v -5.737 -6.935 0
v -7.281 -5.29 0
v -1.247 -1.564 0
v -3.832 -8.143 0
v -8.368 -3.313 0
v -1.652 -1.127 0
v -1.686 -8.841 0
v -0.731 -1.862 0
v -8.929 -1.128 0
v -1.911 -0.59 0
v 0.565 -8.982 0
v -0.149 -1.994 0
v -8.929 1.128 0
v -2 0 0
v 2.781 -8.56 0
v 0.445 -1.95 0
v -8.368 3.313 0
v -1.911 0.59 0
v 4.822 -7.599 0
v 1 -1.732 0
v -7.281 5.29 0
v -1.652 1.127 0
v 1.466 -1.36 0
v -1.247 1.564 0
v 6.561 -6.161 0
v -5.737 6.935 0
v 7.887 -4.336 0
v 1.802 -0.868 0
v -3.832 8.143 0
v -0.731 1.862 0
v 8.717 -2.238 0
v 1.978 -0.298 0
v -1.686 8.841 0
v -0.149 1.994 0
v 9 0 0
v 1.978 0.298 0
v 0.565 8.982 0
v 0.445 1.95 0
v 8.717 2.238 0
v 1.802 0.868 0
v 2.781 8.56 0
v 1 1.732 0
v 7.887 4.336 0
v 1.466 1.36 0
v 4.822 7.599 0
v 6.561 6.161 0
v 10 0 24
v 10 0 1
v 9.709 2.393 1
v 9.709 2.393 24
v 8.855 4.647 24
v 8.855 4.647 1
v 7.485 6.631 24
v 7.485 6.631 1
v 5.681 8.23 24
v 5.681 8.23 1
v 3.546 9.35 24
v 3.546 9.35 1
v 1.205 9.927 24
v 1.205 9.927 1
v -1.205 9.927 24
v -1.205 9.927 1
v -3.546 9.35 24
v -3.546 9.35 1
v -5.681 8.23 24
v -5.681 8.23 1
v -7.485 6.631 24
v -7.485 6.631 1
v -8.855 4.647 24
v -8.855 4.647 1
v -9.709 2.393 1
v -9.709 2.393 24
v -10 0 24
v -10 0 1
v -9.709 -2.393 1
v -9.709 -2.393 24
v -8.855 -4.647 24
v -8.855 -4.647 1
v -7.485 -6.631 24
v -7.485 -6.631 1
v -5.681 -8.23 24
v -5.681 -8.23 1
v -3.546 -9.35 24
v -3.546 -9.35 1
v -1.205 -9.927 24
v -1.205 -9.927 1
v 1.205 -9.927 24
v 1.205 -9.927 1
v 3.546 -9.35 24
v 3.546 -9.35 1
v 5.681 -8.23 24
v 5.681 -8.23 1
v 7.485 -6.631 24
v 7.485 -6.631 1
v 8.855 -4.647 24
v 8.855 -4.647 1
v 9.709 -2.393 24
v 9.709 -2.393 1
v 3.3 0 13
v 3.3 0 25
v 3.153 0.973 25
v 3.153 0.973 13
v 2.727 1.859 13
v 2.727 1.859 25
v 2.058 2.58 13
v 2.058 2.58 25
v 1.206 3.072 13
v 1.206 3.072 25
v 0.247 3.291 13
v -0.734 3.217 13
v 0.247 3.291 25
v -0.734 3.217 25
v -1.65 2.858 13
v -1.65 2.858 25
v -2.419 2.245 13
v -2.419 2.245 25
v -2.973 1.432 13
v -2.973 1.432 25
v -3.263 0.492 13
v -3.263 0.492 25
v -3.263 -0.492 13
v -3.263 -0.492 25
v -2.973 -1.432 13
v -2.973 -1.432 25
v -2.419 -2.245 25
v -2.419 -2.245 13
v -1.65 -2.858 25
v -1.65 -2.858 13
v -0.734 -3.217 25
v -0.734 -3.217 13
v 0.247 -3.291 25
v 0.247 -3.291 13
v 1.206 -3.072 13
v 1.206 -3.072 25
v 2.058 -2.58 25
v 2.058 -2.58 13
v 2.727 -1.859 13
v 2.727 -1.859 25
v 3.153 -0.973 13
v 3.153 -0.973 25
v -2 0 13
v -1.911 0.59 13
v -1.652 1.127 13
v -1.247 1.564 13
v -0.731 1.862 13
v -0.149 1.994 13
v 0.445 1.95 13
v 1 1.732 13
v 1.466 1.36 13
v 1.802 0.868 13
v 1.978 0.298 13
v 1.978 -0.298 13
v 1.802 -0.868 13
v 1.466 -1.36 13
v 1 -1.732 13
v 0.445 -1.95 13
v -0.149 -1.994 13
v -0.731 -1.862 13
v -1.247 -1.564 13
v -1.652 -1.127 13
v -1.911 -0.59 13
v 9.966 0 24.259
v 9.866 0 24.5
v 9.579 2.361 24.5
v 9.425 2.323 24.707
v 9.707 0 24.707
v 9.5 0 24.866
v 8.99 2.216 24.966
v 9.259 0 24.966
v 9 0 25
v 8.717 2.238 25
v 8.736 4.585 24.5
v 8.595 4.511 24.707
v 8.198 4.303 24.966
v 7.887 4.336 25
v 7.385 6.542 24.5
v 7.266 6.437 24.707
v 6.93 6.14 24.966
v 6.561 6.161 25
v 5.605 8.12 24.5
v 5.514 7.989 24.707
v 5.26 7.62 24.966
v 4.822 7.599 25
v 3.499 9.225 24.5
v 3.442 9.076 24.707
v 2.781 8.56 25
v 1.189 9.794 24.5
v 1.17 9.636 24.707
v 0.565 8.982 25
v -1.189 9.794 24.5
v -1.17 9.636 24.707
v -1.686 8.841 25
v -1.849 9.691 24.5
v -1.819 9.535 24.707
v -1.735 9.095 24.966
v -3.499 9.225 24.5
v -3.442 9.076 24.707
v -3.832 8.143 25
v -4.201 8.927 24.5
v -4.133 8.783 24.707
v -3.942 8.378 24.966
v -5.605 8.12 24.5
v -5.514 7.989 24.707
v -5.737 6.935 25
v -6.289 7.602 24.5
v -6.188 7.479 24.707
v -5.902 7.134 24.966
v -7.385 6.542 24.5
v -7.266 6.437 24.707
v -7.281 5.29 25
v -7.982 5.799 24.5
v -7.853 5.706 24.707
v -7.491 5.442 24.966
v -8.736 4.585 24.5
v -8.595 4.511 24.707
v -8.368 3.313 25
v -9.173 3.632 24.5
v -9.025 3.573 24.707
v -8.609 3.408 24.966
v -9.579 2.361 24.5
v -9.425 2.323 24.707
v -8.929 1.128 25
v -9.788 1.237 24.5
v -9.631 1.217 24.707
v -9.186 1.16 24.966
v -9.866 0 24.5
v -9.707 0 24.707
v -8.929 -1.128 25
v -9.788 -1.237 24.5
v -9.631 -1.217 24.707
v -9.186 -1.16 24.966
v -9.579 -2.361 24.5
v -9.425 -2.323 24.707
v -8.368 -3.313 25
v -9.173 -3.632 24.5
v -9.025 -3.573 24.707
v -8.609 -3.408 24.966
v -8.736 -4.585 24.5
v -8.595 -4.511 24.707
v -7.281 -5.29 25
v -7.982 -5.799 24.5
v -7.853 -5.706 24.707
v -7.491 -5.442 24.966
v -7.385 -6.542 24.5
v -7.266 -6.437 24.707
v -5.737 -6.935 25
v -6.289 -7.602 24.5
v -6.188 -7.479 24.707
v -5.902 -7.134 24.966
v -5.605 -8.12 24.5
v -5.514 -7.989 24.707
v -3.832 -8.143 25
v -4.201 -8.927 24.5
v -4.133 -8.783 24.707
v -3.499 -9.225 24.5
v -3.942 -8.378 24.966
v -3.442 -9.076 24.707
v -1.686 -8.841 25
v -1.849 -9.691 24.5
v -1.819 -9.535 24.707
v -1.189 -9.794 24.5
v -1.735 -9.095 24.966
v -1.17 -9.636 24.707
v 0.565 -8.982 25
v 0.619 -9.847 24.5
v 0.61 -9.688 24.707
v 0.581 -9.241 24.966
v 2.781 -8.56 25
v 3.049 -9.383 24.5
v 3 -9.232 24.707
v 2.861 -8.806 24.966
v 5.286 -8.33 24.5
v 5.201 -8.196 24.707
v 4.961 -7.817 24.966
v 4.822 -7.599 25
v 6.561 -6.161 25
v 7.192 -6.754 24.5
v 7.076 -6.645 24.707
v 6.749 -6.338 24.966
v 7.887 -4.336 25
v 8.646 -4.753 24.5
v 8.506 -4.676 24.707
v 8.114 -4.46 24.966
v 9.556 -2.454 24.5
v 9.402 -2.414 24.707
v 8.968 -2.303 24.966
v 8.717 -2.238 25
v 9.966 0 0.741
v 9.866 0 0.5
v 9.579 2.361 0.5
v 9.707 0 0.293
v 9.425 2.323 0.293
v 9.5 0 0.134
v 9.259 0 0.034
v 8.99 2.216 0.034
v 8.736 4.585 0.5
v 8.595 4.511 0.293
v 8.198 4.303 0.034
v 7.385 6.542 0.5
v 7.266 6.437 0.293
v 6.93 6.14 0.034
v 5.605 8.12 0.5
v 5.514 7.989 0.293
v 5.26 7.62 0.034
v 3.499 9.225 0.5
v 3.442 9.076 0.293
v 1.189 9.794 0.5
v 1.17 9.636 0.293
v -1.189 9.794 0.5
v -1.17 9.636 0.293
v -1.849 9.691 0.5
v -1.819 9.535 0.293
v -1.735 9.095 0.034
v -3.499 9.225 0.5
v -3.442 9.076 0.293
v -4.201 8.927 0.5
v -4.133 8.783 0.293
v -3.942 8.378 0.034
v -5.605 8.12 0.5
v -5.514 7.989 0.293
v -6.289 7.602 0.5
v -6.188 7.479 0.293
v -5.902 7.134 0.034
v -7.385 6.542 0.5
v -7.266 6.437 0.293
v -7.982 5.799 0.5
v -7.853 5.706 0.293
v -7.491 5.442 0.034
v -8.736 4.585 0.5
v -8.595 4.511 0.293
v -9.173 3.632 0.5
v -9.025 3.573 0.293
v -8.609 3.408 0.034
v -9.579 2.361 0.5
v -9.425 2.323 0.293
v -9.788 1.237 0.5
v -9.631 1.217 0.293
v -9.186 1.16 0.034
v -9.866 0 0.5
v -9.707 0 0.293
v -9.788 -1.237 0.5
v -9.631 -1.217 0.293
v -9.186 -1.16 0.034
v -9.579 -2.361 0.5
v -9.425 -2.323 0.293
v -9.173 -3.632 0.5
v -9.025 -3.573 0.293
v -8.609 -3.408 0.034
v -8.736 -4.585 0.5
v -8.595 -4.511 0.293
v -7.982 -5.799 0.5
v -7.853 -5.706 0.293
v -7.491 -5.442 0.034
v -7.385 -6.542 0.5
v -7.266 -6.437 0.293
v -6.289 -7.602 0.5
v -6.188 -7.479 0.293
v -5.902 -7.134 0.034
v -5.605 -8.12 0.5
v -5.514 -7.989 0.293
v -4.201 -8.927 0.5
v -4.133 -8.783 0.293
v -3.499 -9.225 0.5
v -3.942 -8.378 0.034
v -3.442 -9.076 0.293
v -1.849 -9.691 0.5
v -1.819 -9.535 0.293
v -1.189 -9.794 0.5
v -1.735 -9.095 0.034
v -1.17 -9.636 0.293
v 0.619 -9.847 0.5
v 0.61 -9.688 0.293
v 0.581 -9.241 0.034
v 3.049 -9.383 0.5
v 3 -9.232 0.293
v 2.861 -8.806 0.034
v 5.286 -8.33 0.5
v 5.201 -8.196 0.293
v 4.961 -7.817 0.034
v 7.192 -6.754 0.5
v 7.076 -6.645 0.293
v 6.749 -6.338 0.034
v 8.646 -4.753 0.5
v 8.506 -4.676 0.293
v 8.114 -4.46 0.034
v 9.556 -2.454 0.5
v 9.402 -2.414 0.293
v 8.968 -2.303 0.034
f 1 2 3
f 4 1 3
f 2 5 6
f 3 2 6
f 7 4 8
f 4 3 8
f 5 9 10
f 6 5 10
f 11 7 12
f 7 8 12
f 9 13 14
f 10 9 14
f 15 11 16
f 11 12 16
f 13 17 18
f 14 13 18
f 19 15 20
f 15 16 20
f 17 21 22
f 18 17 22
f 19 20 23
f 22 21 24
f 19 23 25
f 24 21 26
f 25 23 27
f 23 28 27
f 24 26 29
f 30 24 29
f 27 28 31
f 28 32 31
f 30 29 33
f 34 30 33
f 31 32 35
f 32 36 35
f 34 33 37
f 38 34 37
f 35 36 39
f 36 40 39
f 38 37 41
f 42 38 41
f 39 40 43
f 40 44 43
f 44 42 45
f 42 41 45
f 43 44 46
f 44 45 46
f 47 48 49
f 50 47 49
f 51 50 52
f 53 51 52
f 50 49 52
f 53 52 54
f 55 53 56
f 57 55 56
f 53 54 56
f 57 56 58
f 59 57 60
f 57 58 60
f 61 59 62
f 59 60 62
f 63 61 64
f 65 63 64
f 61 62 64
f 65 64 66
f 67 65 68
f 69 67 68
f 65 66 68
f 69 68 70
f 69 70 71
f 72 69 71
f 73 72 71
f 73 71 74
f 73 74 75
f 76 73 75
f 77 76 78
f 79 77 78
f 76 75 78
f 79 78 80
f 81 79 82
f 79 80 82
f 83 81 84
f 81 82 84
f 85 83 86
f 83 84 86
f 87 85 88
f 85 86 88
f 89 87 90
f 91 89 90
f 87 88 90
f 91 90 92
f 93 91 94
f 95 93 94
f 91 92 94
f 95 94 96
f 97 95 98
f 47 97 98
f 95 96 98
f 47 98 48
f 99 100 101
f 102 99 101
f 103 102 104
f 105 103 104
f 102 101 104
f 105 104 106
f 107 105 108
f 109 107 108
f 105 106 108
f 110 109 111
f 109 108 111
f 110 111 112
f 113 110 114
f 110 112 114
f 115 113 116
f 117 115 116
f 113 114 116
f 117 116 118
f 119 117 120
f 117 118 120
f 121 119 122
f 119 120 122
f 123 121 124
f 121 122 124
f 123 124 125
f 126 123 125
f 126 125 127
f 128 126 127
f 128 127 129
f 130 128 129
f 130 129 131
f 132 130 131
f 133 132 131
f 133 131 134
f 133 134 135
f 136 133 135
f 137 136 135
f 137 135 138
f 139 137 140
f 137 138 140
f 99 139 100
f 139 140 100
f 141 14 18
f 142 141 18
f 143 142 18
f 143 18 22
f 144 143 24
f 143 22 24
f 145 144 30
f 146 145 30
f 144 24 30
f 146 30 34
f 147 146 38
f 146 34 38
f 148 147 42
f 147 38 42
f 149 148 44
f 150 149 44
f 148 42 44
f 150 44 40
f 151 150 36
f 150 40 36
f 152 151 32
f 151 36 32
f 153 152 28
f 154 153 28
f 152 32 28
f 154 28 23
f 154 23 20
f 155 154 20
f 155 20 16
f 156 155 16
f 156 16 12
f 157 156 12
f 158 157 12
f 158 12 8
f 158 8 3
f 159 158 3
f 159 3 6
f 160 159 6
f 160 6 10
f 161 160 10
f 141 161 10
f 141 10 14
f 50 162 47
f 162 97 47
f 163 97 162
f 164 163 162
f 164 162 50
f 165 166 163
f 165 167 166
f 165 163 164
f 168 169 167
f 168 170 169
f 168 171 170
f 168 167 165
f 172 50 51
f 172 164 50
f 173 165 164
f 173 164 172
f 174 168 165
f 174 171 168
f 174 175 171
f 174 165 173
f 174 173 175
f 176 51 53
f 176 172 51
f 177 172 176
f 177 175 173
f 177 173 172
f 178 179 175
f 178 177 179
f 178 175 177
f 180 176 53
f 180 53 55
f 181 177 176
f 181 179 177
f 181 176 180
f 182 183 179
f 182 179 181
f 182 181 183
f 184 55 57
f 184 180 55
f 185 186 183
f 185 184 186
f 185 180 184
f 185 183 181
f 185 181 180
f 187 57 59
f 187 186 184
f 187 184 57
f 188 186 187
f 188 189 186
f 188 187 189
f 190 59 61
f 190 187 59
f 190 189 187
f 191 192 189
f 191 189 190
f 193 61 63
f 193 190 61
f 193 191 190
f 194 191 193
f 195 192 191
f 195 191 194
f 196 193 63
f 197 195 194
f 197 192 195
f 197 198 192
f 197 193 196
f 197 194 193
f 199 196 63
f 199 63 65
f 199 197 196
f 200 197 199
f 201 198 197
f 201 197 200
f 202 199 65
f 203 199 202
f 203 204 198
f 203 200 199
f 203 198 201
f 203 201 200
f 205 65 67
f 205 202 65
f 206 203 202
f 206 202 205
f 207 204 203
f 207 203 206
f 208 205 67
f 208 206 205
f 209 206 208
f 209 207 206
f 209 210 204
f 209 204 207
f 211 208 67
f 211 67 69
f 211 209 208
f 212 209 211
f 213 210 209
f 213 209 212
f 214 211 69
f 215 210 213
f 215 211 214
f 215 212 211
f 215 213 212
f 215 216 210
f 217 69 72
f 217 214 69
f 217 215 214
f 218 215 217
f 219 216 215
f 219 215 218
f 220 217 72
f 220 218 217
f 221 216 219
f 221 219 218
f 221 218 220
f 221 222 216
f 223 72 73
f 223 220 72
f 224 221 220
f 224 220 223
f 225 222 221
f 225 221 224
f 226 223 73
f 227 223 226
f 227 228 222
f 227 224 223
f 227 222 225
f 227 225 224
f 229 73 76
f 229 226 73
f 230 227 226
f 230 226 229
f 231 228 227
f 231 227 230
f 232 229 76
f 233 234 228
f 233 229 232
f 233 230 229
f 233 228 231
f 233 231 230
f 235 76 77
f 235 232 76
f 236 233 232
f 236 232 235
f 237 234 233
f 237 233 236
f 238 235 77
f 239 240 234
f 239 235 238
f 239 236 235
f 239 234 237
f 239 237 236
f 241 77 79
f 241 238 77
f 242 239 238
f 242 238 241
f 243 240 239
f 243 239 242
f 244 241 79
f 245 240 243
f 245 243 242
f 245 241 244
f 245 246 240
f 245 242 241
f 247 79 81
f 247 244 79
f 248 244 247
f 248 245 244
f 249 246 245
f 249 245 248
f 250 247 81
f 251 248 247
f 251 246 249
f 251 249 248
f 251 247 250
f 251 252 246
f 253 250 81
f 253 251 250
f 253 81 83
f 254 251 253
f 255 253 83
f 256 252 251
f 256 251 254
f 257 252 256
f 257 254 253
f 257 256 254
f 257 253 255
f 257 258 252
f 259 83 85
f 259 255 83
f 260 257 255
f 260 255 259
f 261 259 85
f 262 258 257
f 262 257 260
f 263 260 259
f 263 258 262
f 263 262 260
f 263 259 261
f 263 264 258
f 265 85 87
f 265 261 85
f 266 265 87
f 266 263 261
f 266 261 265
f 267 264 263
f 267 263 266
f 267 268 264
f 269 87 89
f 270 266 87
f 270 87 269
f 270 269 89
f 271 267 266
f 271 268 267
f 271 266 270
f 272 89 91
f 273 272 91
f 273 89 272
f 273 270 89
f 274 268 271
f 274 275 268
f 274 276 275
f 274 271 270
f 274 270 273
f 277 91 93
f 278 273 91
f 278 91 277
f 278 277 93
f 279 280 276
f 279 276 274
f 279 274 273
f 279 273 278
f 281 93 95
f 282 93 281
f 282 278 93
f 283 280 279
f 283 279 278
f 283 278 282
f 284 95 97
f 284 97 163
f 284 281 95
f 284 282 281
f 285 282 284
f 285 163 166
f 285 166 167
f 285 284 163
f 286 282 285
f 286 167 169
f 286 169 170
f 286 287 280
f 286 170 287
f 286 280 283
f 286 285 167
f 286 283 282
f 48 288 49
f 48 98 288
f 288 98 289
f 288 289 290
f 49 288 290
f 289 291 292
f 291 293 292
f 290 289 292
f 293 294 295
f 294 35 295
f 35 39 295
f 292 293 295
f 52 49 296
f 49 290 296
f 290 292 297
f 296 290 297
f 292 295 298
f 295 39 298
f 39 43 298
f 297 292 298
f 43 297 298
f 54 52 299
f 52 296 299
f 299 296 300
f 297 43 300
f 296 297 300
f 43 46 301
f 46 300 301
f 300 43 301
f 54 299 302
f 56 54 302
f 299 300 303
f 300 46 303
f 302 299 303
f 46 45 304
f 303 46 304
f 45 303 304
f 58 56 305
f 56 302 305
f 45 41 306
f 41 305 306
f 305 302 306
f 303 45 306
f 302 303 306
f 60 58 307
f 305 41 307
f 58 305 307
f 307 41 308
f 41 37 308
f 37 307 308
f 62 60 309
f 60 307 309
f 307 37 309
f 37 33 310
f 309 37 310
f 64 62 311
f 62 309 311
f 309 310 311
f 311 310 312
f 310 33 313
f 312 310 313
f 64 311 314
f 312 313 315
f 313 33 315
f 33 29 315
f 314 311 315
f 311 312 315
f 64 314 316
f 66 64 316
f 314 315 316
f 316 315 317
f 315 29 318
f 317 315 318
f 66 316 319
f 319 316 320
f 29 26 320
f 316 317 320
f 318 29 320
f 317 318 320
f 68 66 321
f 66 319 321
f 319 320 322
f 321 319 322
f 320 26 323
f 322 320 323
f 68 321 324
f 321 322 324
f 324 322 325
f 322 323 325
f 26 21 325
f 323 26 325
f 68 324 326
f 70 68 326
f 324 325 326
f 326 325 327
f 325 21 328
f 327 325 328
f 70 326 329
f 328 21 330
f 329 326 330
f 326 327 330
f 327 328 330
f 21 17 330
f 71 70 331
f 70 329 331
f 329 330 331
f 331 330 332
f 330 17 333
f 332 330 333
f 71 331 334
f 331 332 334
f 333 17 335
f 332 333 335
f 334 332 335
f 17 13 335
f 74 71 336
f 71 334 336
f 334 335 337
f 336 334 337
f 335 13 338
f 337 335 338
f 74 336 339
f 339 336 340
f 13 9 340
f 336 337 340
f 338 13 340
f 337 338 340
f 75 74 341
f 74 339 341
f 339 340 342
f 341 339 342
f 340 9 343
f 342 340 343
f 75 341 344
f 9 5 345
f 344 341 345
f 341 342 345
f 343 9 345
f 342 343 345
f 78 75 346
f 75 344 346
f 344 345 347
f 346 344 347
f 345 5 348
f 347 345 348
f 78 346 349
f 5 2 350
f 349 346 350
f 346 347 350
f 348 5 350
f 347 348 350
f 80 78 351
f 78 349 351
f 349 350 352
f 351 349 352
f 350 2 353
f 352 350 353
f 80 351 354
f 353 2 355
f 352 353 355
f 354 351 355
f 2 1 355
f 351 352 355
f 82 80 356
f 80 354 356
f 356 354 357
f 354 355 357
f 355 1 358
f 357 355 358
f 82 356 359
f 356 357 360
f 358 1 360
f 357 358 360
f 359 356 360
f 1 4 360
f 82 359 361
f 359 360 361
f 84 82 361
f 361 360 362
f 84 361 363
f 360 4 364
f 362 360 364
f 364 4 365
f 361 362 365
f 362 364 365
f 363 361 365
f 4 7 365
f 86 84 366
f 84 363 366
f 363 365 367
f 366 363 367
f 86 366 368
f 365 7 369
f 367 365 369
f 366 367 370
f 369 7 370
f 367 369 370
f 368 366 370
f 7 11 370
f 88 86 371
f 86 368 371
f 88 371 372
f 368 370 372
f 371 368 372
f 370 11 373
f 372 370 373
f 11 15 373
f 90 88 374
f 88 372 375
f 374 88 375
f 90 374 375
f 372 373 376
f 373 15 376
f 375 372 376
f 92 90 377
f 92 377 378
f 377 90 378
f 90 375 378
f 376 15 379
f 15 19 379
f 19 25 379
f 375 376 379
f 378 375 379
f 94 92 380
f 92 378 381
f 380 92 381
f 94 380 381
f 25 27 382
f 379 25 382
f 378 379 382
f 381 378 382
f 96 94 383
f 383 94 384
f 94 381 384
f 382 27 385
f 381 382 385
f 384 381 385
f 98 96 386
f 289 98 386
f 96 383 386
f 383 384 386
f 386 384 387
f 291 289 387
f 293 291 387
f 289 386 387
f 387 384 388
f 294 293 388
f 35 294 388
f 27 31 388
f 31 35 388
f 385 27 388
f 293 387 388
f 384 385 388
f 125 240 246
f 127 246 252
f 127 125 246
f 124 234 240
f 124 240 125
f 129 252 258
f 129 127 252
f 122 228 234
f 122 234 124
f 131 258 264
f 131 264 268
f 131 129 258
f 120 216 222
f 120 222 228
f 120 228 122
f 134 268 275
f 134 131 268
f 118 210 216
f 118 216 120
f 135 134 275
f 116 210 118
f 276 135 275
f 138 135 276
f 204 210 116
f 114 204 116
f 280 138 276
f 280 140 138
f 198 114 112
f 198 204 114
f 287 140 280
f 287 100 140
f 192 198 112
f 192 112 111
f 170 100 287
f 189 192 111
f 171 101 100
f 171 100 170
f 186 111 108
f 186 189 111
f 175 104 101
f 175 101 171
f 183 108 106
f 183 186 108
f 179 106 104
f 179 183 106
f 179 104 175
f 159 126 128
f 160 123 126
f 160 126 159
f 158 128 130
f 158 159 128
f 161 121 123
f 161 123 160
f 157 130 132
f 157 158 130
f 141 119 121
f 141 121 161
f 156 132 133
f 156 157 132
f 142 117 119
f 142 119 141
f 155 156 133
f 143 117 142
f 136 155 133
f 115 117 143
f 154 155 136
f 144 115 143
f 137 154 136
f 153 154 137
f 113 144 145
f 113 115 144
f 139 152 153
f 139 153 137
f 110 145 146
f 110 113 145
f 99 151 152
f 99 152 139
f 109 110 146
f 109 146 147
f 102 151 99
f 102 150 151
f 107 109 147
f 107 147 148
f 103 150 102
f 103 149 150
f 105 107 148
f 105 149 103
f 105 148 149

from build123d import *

# Parameters (mm, degrees)
SKETCH_1_R          = 10
EXTRUDE_1_DEPTH     = 25
SKETCH_2_R          = 3.3
CUT_EXTRUDE_1_DEPTH = 12
FILLET_1_R          = 1
SKETCH_3_R          = 2
CUT_EXTRUDE_2_DEPTH = 29.722813268


with BuildPart() as part:
    # 草图1 → 凸台-拉伸1 (new body)
    with BuildSketch(Plane.XY):
        Circle(SKETCH_1_R)
    extrude(amount=EXTRUDE_1_DEPTH)

    # 草图2 → 切除-拉伸1 (cut)
    with BuildSketch(Plane.XY.offset(25)):
        Circle(SKETCH_2_R)
    extrude(amount=-CUT_EXTRUDE_1_DEPTH, mode=Mode.SUBTRACT)

    # 圆角1
    fillet_1_edges = [part.edges().sort_by_distance(p)[0] for p in [
        (-10, 0, 0),
        (-10, 0, 25),
    ]]
    fillet(fillet_1_edges, radius=FILLET_1_R)

    # 草图3 → 切除-拉伸2 (cut, through all)
    with BuildSketch(Plane(origin=(0, 0, 0), x_dir=(-1, 0, 0), z_dir=(0, 0, -1))):
        Circle(SKETCH_3_R)
    extrude(amount=-CUT_EXTRUDE_2_DEPTH, mode=Mode.SUBTRACT)


solid = part.part
